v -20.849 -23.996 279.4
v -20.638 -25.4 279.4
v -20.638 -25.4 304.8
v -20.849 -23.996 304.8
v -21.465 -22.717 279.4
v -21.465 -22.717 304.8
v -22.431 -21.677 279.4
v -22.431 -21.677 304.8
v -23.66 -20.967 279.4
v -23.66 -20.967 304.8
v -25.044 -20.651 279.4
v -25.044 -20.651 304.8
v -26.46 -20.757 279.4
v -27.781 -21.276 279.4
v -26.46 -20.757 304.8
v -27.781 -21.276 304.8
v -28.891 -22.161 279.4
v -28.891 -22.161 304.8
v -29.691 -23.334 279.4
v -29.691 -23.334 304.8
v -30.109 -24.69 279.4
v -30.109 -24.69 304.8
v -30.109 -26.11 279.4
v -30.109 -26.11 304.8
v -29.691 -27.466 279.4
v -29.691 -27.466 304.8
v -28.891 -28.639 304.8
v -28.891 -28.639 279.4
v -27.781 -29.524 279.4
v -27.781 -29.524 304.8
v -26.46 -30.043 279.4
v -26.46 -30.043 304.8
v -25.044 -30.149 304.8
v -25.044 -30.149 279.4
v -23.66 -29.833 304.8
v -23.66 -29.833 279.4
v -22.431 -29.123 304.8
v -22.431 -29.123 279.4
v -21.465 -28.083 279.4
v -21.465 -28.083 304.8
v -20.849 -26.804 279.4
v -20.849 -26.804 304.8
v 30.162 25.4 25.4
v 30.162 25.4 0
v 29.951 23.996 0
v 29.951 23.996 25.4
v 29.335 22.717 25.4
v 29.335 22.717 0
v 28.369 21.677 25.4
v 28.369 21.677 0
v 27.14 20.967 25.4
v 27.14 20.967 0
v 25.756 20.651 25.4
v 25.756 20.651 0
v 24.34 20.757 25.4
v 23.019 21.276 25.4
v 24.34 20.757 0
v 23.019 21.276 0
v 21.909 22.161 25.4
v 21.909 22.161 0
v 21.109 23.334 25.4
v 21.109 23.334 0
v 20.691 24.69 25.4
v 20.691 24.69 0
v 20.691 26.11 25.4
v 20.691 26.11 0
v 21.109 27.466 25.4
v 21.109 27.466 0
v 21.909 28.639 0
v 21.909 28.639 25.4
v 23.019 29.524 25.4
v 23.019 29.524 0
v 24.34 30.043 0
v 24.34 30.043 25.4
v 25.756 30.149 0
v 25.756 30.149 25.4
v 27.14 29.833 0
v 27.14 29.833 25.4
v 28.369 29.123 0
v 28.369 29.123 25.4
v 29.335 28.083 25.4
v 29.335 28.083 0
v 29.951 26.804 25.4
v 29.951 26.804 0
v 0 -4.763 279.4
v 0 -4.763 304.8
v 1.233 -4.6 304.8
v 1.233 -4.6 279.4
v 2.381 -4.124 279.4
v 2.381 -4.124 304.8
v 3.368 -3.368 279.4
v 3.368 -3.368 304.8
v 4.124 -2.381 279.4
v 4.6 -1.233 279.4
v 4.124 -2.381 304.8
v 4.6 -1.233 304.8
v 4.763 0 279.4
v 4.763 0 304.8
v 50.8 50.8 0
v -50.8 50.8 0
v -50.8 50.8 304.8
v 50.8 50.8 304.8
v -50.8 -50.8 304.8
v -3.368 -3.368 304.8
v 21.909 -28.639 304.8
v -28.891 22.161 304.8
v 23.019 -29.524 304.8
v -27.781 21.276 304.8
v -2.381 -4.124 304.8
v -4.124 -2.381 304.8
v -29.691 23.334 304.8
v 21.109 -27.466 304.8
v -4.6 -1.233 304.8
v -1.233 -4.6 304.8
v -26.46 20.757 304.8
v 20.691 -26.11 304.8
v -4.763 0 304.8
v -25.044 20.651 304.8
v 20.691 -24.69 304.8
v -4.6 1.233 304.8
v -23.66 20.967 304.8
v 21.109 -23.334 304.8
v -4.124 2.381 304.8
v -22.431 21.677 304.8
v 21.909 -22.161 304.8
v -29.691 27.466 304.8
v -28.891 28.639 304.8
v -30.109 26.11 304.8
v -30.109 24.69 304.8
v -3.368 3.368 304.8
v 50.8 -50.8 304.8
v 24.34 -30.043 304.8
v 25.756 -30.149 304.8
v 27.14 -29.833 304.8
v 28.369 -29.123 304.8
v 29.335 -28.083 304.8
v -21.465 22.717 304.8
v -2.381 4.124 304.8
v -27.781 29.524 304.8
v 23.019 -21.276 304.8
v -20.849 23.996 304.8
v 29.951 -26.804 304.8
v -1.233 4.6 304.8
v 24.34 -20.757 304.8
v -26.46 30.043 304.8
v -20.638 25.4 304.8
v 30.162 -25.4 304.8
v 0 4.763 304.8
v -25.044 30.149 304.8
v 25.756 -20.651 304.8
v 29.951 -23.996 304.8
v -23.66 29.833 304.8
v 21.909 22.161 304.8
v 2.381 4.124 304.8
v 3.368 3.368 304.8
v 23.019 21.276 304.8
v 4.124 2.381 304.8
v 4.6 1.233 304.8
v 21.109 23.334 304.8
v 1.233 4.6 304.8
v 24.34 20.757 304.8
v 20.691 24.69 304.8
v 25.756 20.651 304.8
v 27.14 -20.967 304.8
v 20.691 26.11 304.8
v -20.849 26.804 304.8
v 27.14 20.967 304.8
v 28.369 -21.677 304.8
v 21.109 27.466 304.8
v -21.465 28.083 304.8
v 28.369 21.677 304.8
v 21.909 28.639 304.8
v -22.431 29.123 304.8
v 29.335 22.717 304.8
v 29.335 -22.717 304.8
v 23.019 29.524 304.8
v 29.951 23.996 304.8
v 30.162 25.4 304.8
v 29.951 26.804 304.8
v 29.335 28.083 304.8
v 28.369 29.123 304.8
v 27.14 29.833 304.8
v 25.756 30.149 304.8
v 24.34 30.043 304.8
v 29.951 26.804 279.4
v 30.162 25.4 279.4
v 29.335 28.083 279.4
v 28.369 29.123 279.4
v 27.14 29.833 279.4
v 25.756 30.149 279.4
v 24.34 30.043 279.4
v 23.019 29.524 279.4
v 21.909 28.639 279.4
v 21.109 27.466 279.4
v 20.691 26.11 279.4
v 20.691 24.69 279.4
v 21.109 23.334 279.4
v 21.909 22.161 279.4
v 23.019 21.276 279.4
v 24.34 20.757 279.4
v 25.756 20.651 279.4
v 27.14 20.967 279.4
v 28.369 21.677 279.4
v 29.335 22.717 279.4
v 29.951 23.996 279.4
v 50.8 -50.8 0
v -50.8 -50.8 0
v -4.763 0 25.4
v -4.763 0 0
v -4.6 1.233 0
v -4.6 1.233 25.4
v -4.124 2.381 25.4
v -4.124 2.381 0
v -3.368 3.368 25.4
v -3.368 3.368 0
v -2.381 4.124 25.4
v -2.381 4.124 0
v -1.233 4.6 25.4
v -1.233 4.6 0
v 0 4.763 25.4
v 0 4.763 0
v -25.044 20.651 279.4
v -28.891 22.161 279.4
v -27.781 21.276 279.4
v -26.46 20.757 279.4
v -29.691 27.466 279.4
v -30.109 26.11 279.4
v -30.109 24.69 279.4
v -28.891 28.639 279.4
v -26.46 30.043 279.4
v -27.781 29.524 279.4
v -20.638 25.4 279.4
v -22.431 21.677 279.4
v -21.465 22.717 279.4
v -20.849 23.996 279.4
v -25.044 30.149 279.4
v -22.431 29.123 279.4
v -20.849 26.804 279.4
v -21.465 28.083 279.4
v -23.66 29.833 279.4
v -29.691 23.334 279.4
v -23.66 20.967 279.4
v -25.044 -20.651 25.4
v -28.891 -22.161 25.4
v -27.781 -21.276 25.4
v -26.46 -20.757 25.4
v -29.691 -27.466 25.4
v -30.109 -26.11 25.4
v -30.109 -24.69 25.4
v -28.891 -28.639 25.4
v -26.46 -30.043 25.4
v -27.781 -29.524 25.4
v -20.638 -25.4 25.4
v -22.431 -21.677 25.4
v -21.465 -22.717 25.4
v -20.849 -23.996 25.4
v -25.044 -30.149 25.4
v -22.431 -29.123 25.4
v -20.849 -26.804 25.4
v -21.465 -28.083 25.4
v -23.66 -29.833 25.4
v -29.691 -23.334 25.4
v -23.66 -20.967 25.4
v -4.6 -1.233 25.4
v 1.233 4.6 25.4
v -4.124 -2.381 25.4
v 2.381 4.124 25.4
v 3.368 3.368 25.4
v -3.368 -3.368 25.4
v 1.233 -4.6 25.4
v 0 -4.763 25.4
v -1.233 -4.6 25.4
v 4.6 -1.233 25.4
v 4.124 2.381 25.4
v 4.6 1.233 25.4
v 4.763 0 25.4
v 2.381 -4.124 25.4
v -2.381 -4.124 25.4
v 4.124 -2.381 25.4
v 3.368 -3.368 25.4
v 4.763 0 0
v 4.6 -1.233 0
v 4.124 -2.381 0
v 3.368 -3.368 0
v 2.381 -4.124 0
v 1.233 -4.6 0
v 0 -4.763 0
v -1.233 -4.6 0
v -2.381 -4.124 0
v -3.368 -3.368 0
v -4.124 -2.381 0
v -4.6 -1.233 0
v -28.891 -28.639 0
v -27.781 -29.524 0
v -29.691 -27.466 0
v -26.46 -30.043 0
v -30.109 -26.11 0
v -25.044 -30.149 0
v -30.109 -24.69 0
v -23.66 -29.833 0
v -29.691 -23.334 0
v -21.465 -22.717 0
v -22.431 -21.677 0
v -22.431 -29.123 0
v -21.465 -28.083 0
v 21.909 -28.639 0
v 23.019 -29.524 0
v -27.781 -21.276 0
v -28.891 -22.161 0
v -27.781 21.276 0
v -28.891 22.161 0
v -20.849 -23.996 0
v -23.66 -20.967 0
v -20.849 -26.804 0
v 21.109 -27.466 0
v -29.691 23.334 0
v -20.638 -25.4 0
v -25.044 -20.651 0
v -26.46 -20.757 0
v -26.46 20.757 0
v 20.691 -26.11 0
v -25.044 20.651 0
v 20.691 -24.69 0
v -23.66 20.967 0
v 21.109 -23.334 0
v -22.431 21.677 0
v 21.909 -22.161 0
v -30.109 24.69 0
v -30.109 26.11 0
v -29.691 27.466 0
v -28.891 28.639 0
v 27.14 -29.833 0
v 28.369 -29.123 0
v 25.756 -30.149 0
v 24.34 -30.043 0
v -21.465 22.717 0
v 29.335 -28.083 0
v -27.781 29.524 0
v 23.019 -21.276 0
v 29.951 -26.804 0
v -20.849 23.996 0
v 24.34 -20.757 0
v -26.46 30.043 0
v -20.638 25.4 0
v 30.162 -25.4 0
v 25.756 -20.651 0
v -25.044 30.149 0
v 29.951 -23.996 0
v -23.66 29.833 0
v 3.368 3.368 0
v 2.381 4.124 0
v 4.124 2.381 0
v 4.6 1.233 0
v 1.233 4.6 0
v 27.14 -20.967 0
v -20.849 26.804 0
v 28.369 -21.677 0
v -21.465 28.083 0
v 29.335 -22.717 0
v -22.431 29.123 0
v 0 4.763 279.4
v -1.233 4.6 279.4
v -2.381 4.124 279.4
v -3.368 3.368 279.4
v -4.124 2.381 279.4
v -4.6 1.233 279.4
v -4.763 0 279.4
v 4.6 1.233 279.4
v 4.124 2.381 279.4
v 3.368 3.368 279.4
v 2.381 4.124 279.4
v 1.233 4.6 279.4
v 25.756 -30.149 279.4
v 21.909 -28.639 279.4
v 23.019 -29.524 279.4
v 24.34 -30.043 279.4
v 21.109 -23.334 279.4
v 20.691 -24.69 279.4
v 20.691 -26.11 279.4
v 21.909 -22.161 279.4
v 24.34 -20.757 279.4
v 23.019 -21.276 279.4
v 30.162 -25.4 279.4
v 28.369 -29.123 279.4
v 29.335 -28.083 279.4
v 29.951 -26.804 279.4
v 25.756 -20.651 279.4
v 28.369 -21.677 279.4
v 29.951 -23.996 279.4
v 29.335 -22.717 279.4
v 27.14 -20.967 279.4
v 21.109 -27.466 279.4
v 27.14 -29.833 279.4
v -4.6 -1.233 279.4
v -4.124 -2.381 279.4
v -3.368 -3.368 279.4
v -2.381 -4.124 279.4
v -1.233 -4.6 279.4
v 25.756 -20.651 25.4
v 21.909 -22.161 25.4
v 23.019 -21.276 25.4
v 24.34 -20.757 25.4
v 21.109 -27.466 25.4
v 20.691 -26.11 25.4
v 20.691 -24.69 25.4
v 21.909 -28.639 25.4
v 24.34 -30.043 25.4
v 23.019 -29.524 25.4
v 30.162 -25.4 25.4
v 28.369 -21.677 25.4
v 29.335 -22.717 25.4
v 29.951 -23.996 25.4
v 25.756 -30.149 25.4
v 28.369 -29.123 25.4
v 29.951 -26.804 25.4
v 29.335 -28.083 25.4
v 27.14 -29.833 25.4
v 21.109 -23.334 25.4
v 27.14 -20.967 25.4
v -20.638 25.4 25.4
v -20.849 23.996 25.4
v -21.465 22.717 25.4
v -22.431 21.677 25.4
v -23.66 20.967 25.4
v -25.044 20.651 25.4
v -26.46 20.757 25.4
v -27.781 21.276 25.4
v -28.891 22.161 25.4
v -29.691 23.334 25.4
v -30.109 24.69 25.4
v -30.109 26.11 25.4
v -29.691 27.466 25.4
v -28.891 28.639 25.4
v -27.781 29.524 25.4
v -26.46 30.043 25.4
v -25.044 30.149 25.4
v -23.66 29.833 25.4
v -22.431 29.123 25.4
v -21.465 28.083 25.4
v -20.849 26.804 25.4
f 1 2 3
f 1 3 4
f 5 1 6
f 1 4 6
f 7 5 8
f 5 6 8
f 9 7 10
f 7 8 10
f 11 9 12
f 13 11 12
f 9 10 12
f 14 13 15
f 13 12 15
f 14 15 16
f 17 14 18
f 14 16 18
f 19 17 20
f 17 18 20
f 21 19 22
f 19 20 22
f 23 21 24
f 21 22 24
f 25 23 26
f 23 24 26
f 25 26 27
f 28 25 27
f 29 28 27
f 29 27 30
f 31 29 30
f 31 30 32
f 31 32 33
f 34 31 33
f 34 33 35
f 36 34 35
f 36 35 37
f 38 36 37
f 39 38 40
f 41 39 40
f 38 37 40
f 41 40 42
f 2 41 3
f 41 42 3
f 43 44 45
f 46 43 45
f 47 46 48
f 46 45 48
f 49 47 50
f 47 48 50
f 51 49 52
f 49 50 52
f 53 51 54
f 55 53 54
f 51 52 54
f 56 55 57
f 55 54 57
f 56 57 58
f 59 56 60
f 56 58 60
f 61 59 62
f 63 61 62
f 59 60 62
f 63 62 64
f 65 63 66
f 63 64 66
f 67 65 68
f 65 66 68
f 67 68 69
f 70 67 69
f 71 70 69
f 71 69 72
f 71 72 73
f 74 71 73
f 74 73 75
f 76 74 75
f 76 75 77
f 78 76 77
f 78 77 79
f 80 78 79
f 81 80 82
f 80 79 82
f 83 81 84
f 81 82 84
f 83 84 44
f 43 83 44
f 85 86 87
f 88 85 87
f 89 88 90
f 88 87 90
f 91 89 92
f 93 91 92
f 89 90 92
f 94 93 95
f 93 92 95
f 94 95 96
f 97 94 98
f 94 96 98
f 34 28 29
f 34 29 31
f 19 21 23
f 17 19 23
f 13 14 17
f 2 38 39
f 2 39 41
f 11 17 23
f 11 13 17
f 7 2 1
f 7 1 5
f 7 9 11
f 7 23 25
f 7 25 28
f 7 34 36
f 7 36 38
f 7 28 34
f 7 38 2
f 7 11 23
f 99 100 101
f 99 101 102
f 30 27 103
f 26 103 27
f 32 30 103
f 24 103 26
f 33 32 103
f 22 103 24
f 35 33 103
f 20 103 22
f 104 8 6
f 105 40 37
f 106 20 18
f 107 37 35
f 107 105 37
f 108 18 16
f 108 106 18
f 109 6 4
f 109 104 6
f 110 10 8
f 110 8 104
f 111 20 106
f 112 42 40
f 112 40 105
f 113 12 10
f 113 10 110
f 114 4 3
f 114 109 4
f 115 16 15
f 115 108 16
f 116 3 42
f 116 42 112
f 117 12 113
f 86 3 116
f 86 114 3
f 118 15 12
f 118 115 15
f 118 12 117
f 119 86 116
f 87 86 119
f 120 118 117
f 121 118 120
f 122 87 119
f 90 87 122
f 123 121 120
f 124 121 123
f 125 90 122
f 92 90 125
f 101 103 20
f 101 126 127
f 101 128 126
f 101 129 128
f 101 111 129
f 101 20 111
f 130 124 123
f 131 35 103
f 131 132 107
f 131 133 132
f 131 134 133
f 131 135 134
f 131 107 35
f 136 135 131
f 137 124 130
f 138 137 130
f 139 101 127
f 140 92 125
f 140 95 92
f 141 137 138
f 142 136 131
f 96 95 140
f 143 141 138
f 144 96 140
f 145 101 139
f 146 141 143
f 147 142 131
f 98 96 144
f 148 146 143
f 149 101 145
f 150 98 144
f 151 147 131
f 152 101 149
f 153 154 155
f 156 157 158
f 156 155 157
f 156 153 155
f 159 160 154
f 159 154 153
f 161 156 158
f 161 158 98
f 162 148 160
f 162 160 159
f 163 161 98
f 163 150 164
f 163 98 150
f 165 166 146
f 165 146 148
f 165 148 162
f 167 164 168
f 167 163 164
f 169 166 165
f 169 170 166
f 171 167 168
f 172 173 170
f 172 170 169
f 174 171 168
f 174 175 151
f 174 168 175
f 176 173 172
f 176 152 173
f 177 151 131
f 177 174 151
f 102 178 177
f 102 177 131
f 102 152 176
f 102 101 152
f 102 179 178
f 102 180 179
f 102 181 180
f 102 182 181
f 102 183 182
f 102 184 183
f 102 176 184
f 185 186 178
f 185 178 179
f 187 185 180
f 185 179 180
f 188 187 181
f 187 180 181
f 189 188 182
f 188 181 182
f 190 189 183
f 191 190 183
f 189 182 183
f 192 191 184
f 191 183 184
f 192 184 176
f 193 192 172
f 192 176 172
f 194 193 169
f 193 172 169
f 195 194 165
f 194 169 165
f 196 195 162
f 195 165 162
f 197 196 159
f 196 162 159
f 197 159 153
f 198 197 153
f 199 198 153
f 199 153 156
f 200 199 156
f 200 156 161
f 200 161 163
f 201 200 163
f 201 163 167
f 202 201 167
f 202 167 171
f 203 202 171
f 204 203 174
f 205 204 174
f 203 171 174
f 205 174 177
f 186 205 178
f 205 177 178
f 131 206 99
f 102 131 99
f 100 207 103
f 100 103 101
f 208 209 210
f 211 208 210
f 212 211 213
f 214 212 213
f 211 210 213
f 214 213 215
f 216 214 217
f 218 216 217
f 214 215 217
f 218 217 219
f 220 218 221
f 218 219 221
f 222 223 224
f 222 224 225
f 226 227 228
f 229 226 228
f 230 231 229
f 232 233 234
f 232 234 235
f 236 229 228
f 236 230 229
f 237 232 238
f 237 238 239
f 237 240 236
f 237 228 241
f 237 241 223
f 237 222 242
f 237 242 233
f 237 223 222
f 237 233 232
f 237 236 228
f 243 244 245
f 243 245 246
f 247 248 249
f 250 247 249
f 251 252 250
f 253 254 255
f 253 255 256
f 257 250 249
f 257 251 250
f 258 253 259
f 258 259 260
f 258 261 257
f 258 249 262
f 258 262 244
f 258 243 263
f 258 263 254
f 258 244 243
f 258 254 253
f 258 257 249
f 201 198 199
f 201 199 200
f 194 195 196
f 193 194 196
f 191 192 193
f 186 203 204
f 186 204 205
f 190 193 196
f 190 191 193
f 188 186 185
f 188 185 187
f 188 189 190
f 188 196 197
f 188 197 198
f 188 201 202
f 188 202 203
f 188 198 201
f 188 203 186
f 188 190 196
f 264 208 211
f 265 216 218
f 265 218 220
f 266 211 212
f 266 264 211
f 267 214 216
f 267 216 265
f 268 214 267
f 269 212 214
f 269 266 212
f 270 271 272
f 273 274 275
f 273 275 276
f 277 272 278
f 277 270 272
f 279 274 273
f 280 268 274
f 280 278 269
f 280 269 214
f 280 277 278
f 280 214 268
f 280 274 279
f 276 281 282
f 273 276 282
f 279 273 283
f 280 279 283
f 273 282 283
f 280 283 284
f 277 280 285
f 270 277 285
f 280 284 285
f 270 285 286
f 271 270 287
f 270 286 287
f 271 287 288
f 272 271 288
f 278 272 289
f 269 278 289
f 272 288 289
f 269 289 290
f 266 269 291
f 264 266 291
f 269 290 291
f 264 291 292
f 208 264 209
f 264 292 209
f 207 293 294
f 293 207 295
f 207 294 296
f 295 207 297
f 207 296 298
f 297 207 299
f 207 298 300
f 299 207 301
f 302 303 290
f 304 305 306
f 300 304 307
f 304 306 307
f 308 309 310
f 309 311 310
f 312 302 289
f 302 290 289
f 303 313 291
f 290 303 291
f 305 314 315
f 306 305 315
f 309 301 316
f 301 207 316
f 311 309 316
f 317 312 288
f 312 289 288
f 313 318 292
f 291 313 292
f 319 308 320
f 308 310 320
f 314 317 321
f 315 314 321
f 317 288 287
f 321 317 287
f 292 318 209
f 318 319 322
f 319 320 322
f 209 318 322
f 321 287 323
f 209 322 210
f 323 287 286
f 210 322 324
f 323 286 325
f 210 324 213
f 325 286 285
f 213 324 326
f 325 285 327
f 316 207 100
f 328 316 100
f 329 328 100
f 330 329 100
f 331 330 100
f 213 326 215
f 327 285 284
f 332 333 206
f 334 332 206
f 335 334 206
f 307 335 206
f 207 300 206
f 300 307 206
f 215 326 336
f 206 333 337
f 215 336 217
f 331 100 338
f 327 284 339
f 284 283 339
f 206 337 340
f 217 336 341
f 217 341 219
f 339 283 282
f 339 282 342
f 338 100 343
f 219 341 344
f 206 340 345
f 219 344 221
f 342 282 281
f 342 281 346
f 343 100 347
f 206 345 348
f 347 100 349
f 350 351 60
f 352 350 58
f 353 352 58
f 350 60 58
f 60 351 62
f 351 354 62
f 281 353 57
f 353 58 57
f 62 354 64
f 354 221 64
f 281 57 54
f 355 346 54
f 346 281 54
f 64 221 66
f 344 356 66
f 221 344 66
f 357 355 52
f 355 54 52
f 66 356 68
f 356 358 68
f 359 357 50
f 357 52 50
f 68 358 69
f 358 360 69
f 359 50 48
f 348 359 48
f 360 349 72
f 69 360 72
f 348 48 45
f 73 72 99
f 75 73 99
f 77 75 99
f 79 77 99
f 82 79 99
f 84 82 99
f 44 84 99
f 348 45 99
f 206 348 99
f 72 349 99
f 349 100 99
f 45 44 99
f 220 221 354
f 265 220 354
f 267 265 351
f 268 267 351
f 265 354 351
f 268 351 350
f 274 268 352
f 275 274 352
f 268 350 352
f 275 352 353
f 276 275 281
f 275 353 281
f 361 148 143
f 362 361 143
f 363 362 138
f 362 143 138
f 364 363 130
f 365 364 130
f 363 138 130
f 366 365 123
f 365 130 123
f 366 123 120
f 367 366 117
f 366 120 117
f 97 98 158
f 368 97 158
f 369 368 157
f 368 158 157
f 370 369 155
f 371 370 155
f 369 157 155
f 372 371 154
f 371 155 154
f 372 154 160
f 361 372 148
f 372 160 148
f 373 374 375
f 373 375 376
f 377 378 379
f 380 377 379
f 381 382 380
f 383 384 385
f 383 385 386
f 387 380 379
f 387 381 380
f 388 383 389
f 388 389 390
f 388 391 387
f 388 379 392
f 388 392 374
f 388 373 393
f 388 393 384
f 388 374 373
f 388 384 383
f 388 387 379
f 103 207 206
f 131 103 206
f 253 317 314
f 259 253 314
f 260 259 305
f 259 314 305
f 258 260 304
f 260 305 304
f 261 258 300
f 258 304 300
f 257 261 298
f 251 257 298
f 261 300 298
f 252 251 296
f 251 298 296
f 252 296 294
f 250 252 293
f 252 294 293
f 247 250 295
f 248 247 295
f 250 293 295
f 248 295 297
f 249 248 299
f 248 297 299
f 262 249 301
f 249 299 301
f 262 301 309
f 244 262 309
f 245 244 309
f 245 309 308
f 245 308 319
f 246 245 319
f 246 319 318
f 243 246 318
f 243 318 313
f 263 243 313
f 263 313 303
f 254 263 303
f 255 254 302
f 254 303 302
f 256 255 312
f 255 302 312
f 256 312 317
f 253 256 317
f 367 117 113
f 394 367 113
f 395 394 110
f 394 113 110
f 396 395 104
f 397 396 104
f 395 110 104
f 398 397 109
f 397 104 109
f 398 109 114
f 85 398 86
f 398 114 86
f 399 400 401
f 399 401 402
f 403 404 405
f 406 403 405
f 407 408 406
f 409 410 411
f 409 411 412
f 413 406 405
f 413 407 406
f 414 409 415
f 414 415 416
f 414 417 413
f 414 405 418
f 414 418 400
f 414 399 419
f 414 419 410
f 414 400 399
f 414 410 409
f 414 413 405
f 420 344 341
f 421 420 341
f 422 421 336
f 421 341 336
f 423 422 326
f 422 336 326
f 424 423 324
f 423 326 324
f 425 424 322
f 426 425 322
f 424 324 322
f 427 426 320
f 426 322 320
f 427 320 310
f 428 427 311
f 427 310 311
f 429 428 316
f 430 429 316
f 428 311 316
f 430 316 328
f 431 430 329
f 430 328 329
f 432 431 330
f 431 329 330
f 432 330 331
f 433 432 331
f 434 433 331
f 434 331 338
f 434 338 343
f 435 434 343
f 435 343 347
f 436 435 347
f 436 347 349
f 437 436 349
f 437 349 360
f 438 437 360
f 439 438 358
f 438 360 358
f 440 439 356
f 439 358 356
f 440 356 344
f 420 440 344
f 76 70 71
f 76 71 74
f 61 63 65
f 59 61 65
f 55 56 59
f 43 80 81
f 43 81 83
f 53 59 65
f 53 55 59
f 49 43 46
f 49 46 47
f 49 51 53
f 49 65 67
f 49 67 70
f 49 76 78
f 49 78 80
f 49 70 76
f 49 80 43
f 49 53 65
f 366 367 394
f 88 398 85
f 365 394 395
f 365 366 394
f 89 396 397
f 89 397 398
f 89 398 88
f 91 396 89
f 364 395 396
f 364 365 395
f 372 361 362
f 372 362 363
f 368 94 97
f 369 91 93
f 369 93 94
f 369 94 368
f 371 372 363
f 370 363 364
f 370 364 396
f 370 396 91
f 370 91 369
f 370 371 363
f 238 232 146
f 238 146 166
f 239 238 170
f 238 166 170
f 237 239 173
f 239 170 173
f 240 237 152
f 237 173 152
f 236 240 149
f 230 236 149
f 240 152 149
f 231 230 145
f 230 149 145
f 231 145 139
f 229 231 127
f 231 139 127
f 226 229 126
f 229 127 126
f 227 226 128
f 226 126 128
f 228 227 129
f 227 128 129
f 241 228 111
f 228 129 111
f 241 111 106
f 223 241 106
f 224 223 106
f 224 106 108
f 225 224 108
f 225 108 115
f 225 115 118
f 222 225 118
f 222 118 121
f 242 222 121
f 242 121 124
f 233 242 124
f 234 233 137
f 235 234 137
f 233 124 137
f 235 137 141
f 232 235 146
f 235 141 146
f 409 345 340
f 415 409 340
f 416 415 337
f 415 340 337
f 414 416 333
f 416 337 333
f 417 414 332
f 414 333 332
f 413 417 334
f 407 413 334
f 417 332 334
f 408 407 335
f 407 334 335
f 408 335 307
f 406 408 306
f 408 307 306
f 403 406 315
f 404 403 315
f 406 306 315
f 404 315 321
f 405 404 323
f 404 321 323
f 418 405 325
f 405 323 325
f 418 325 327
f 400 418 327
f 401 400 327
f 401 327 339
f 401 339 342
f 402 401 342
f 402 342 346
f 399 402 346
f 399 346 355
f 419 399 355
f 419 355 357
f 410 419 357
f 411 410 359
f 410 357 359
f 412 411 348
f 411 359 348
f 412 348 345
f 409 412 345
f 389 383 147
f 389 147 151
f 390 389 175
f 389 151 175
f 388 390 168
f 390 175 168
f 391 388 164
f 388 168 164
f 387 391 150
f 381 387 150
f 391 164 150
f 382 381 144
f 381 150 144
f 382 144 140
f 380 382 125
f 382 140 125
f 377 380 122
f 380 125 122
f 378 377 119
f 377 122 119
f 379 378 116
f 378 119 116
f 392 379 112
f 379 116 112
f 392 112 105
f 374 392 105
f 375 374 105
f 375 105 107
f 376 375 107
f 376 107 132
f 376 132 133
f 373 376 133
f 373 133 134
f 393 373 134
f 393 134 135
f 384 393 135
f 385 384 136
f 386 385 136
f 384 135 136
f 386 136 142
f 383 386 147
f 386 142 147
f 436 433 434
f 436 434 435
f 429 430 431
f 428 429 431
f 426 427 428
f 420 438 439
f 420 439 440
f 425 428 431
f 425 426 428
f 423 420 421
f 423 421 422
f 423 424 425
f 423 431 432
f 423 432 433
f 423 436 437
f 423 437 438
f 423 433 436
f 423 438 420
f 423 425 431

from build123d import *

# Parameters (mm, degrees)
F0_W     = 101.6
F0_H     = 101.6
F1_DEPTH = 304.8
F2_R     = 4.7625
F3_DEPTH = 25.4
F4_R     = 4.7625
F5_DEPTH = 25.4


with BuildPart() as f1:
    # F0 (on Top) → F1 (new body)
    with BuildSketch(Plane.XY):
        Rectangle(F0_W, F0_H)
    extrude(amount=F1_DEPTH)

    # F2 (on face) → F3 (cut)
    with BuildSketch(Plane.XY.offset(304.8)):
        with Locations((-25.4, 25.4)):
            Circle(F2_R)
        with Locations((25.4, 25.4)):
            Circle(F2_R)
        with Locations((25.4, -25.4)):
            Circle(F2_R)
        with BuildLine():
            Line((0, 0), (0, -4.7625))
            ThreePointArc((0, -4.7625), (3.3675960454, -3.3675960454), (4.7625, 0))
            Line((4.7625, 0), (0, 0))
        make_face()
        with BuildLine():
            Line((0, 4.7625), (0, 0))
            Line((0, 0), (4.7625, 0))
            ThreePointArc((4.7625, 0), (3.3675960454, 3.3675960454), (0, 4.7625))
        make_face()
        with BuildLine():
            ThreePointArc((0, 4.7625), (-3.3675960454, 3.3675960454), (-4.7625, 0))
            Line((-4.7625, 0), (0, 0))
            Line((0, 0), (0, 4.7625))
        make_face()
        with BuildLine():
            ThreePointArc((-4.7625, 0), (-3.3675960454, -3.3675960454), (0, -4.7625))
            Line((0, -4.7625), (0, 0))
            Line((0, 0), (-4.7625, 0))
        make_face()
        with Locations((-25.4, -25.4)):
            Circle(F2_R)
    extrude(amount=-F3_DEPTH, mode=Mode.SUBTRACT)

    # F4 (on face) → F5 (cut)
    with BuildSketch(Plane(origin=(0, 0, 0), x_dir=(1, 0, 0), z_dir=(0, 0, -1))):
        with Locations((-25.4, 25.4)):
            Circle(F4_R)
        with Locations((25.4, 25.4)):
            Circle(F4_R)
        with Locations((25.4, -25.4)):
            Circle(F4_R)
        with Locations((-25.4, -25.4)):
            Circle(F4_R)
        with BuildLine():
            Line((0, 0), (-4.7625, 0))
            ThreePointArc((-4.7625, 0), (-3.3675960454, -3.3675960454), (0, -4.7625))
            Line((0, -4.7625), (0, 0))
        make_face()
        with BuildLine():
            Line((0, 0), (0, 4.7625))
            ThreePointArc((0, 4.7625), (-3.3675960454, 3.3675960454), (-4.7625, 0))
            Line((-4.7625, 0), (0, 0))
        make_face()
        with BuildLine():
            ThreePointArc((4.7625, 0), (3.3675960454, 3.3675960454), (0, 4.7625))
            Line((0, 4.7625), (0, 0))
            Line((0, 0), (4.7625, 0))
        make_face()
        with BuildLine():
            Line((4.7625, 0), (0, 0))
            Line((0, 0), (0, -4.7625))
            ThreePointArc((0, -4.7625), (3.3675960454, -3.3675960454), (4.7625, 0))
        make_face()
    extrude(amount=-F5_DEPTH, mode=Mode.SUBTRACT)


solid = f1.part
